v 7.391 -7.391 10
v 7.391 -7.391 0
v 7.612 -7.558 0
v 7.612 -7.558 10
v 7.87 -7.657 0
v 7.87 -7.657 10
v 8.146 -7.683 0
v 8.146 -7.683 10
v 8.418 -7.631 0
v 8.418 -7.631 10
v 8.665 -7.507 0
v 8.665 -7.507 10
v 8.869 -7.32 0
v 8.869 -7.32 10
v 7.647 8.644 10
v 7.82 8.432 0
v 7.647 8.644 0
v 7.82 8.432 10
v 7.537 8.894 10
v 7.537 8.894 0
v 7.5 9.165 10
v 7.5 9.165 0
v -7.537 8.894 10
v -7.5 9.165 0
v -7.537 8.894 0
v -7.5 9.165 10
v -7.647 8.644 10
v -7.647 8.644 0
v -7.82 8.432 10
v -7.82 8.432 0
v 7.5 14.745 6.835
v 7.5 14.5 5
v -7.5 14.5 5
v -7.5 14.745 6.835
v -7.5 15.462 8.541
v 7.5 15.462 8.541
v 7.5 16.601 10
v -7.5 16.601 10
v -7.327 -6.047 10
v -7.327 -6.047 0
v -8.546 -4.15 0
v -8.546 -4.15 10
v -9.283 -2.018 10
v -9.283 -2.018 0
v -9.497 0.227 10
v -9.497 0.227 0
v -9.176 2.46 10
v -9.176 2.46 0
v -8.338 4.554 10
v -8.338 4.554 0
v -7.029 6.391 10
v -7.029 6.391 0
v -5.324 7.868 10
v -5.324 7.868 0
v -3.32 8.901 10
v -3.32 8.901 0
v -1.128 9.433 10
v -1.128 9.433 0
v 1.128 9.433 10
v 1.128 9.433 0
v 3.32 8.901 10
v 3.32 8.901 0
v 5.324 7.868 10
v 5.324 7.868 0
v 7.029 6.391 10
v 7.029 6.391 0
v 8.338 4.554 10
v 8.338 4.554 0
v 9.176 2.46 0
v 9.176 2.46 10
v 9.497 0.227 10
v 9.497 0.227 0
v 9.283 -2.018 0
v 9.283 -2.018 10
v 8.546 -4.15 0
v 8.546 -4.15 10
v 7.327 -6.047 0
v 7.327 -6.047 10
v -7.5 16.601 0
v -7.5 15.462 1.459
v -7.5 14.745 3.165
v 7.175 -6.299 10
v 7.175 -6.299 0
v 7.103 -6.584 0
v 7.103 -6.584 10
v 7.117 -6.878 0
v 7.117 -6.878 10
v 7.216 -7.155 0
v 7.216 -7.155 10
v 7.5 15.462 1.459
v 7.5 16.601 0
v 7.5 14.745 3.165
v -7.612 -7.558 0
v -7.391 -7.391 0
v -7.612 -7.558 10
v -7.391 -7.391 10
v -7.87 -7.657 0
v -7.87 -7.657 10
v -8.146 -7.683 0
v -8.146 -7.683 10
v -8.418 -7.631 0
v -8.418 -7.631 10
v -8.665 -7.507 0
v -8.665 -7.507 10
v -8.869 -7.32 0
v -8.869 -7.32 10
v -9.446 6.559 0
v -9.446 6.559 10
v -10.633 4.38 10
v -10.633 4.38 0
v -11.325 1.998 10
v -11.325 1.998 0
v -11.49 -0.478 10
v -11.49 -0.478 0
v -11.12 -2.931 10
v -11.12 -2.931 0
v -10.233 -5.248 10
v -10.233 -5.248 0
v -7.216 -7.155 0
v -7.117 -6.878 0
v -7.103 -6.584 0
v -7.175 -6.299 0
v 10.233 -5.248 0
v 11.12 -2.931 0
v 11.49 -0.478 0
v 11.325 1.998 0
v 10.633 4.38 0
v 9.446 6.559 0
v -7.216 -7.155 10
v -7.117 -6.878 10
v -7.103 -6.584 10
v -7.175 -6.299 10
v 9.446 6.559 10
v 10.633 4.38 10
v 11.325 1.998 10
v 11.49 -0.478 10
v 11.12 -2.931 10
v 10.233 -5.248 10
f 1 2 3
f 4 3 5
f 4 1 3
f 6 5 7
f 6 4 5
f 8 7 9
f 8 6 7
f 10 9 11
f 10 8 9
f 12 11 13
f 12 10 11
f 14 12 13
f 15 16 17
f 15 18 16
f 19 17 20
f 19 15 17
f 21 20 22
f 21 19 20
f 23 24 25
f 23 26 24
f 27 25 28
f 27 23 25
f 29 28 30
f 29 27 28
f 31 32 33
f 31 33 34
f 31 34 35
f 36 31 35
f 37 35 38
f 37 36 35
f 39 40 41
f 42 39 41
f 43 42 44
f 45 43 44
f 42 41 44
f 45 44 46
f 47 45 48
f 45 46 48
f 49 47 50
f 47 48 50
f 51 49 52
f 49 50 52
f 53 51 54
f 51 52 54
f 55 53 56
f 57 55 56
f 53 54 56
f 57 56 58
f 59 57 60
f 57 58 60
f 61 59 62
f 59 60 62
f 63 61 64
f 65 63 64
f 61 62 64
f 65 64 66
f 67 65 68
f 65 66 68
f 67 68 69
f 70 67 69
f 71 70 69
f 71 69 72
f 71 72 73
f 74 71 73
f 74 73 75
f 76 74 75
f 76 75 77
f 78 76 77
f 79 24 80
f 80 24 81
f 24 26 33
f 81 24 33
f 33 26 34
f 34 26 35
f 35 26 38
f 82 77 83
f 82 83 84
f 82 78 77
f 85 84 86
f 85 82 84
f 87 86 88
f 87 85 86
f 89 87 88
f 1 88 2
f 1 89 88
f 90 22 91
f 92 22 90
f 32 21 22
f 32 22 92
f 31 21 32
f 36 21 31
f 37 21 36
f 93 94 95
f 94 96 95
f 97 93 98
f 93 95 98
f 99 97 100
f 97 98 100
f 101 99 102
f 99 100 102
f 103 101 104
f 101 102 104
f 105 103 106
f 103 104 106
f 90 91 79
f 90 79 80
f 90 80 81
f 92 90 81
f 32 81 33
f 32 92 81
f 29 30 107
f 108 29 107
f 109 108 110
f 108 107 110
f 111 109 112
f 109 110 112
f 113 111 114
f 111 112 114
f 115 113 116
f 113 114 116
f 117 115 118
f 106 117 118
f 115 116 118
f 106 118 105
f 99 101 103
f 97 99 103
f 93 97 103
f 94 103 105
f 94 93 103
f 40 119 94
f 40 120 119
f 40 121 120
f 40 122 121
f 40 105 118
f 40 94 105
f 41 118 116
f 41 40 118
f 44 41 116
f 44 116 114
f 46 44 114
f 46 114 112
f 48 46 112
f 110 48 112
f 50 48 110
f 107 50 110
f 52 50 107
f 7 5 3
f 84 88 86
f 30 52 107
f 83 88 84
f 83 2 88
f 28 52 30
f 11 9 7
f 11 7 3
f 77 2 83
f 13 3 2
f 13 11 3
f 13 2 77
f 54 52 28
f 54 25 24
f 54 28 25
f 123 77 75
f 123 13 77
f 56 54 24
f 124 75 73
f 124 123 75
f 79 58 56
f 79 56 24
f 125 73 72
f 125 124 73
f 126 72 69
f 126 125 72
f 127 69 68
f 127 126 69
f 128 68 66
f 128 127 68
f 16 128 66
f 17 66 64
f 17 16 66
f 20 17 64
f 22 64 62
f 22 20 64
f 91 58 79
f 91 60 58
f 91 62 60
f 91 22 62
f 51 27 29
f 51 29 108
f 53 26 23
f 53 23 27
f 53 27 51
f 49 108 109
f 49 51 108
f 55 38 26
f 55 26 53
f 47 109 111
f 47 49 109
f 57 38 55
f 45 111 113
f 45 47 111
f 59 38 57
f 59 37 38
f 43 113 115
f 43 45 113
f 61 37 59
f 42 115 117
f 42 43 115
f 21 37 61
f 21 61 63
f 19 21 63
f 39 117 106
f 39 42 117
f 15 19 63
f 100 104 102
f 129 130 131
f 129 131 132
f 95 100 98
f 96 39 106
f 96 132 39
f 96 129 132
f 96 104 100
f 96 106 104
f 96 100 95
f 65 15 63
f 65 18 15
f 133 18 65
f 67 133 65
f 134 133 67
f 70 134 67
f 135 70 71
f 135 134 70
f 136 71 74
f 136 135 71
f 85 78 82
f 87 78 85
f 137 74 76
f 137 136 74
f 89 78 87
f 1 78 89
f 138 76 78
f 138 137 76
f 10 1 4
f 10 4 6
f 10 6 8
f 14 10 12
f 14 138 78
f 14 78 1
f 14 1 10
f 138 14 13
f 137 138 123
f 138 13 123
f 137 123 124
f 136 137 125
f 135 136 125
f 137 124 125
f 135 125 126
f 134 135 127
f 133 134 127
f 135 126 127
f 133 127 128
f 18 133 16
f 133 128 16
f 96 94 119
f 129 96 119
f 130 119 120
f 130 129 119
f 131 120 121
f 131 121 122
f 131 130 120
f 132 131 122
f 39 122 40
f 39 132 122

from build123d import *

# Parameters (mm, degrees)
F1_DEPTH = 10
F3_DEPTH = 15
F4_R     = 0.99999


# Not quite as in the source:
# - a fillet or chamfer is up to 0.001 mm smaller than in the source, because OpenCascade refuses the exact size


with BuildPart() as f1:
    # F0 (on Top) → F1 (new body)
    with BuildSketch(Plane.XY):
        with BuildLine():
            ThreePointArc((-6.7175144213, -6.7175144213), (0, 9.5), (6.7175144213, -6.7175144213))
            Line((6.7175144213, -6.7175144213), (8.1317279836, -8.1317279836))
            ThreePointArc((8.1317279836, -8.1317279836), (11.4919258811, 0.430859077), (7.5, 8.7177978871))
            Line((7.5, 8.7177978871), (7.5, 9.5))
            Line((7.5, 9.5), (7.5, 14.5))
            Line((7.5, 14.5), (-7.5, 14.5))
            Line((-7.5, 14.5), (-7.5, 9.5))
            Line((-7.5, 9.5), (-7.5, 8.7177978871))
            ThreePointArc((-7.5, 8.7177978871), (-11.4919258811, 0.430859077), (-8.1317279836, -8.1317279836))
            Line((-8.1317279836, -8.1317279836), (-6.7175144213, -6.7175144213))
        make_face()
    extrude(amount=F1_DEPTH)

    # F2 (on face) → F3 (join, through all)
    with BuildSketch(Plane.YZ.offset(7.5)):
        with BuildLine():
            ThreePointArc((14.5, 5), (15.0465956117, 7.7117470016), (16.6010205144, 10))
            Line((16.6010205144, 10), (14.5, 10))
            Line((14.5, 10), (14.5, 5))
        make_face()
        with BuildLine():
            Line((14.5, 0), (16.6010205144, 0))
            ThreePointArc((16.6010205144, 0), (15.0465956117, 2.2882529984), (14.5, 5))
            Line((14.5, 5), (14.5, 0))
        make_face()
    extrude(amount=-F3_DEPTH)

    # F4 (radius 1 in the source; OpenCascade refuses exactly that, so slightly less here)
    f4_edges = [f1.edges().sort_by_distance(p)[0] for p in [
        (-6.717514, -6.717514, 5),
        (-8.131728, -8.131728, 5),
        (8.131728, -8.131728, 5),
        (6.717514, -6.717514, 5),
        (7.5, 8.717798, 5),
        (-7.5, 8.717798, 5),
    ]]
    fillet(f4_edges, radius=F4_R)


solid = f1.part
